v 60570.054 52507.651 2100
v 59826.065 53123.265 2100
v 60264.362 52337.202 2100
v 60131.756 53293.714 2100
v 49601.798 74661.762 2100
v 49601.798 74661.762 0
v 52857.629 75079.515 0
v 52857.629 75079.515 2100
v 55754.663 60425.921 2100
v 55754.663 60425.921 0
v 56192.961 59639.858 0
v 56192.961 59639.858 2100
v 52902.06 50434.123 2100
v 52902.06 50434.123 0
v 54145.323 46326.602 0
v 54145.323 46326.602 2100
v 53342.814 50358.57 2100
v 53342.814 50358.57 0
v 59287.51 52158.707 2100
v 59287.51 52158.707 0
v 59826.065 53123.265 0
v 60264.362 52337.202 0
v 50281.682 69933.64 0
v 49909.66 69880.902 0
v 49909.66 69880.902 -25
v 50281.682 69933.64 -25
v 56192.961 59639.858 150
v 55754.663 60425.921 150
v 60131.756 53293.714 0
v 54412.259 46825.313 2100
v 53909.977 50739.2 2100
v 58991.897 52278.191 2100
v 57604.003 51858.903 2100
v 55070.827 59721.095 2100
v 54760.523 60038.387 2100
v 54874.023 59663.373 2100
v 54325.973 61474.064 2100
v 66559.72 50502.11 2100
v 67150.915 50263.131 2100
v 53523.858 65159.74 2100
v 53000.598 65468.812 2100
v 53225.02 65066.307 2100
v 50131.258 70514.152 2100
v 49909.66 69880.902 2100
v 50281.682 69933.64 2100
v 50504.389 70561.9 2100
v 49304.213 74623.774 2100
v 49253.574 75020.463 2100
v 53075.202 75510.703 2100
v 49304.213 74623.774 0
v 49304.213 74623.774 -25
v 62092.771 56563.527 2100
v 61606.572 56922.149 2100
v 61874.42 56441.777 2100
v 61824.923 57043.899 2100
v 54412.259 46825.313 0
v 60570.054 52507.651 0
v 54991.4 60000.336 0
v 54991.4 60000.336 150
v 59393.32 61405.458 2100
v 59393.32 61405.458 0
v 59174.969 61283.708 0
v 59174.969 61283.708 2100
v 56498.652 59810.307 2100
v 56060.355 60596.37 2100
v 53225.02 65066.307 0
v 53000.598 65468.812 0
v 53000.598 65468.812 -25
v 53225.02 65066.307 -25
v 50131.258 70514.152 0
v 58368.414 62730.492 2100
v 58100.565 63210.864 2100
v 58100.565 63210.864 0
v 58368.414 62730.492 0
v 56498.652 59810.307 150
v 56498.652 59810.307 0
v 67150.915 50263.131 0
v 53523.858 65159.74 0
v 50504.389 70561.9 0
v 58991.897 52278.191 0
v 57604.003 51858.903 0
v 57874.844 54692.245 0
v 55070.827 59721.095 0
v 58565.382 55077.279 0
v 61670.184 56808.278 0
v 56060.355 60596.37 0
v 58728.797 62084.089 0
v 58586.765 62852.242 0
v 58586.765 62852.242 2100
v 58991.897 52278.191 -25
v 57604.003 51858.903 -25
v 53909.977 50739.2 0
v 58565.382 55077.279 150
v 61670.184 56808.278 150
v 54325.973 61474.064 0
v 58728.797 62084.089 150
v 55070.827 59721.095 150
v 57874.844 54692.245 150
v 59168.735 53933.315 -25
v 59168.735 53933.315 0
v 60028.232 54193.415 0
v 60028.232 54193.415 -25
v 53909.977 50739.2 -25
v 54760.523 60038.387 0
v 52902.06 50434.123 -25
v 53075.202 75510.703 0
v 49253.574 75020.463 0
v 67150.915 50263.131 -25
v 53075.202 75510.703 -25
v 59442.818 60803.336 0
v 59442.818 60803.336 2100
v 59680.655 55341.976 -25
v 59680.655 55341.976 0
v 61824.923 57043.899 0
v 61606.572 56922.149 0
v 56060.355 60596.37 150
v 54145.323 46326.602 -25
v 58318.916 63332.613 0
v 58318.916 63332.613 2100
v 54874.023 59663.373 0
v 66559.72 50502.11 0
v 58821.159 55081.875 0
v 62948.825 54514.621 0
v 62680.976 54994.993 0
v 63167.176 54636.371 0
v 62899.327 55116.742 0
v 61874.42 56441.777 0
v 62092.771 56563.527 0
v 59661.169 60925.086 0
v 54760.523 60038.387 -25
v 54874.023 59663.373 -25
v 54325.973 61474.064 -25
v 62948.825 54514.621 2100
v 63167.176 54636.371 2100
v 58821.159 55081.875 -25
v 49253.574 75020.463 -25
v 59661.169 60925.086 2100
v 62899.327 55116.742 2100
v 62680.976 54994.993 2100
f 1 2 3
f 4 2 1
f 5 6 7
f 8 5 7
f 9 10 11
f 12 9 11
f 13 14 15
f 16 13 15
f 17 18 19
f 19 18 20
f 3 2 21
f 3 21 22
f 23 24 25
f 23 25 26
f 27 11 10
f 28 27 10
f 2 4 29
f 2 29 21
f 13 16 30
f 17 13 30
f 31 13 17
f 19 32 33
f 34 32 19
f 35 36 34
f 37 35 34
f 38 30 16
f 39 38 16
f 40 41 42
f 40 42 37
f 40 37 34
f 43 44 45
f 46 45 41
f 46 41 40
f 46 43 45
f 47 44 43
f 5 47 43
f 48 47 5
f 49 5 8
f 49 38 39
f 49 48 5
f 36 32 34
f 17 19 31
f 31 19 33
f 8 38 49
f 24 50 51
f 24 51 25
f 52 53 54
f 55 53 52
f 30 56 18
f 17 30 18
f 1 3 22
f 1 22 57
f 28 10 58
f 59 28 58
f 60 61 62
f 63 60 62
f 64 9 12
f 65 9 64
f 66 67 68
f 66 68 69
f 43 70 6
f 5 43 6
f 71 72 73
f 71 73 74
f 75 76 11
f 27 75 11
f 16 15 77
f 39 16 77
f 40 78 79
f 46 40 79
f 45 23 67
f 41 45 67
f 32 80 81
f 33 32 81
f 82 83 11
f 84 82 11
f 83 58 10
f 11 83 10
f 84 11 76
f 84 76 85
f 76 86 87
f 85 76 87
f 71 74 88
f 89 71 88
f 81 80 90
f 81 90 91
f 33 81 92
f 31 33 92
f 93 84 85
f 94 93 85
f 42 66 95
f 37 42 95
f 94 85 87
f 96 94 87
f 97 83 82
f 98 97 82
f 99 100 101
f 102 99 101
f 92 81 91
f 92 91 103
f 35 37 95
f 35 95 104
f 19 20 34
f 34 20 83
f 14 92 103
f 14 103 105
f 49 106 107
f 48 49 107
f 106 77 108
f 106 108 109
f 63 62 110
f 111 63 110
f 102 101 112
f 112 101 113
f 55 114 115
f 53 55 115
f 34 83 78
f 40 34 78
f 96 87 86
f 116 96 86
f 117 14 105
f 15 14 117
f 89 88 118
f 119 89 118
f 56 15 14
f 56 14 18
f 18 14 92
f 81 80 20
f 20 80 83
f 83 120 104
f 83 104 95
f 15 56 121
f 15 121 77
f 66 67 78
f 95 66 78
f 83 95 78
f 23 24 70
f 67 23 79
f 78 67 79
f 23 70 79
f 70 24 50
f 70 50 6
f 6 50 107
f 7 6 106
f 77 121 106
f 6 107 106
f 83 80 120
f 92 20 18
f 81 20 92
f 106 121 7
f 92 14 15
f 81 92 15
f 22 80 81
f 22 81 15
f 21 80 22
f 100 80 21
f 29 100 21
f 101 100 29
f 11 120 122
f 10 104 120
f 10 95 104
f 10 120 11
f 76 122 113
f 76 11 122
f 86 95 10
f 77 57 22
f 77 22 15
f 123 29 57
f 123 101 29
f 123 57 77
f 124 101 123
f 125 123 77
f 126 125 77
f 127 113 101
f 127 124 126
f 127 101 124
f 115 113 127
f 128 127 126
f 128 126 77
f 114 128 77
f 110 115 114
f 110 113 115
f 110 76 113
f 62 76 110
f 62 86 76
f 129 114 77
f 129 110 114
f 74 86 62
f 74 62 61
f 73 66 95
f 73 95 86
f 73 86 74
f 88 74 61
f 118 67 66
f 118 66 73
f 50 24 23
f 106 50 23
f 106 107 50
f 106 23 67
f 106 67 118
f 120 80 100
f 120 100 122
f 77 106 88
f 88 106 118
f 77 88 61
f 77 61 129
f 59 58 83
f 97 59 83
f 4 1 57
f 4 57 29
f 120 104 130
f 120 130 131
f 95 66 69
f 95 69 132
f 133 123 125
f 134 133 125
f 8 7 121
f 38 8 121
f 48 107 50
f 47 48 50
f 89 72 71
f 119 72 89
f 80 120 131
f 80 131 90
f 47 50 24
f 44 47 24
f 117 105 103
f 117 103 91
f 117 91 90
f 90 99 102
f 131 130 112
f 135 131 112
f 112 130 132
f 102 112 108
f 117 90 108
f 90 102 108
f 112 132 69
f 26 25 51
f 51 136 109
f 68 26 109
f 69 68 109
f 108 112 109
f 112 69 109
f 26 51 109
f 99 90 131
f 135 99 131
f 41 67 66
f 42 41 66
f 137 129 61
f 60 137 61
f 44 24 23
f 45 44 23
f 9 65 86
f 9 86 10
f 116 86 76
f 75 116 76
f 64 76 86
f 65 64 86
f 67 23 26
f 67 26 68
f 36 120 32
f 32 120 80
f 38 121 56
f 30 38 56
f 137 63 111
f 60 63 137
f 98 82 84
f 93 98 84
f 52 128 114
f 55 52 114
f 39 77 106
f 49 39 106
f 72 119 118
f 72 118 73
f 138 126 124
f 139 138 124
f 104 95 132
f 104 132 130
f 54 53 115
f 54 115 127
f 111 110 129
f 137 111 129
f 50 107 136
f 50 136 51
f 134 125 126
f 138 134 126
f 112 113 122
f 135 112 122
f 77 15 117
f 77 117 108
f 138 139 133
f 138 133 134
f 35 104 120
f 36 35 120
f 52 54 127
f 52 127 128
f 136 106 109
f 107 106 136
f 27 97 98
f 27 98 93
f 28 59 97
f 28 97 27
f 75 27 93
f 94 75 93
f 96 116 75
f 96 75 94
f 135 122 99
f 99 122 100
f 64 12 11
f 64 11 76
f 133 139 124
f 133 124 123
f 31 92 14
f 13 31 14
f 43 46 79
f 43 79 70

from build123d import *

# Parameters (mm, degrees)
F3_DEPTH  = 2100
F5_DEPTH  = 25
F7_DEPTH  = 2100
F9_DEPTH  = 150
F11_DEPTH = 25.001


# Not quite as in the source:
# - ends of sketch curves that miss each other by under 0.0002 mm in the source are joined


with BuildPart() as f3:
    # F2 (on Top) → F3 (new body)
    with BuildSketch(Plane.XY):
        Polygon((52902.0595629306, 50434.1230428591), (54145.32292, 46326.602018), (54431.4219269024, 46413.1983883223), (67150.915474, 50263.131268), (53075.201891, 75510.702684), (49253.5741891713, 75020.4629237414), (49304.213105, 74623.774346), (49909.660074, 69880.902321), (50281.682258, 69933.639978), (53000.597675, 65468.812402), (53225.019852, 65066.306629), (54325.972768, 61474.063518), (54760.522861, 60038.387295), (54874.022799, 59663.37285), (58991.897227, 52278.191447), (57604.002801, 51858.903346), (53909.97748, 50739.1999), align=None)
        Polygon((54412.25928, 46825.31334), (53342.81403, 50358.57026), (59287.509616, 52158.706562), (55070.827017, 59721.094989), (53523.858293, 65159.740021), (50504.389213421, 70561.8996273451), (50131.257661, 70514.151722), (49601.798244, 74661.762303), (52857.629236, 75079.514646), (66559.719817, 50502.109853), align=None, mode=Mode.SUBTRACT)
    extrude(amount=F3_DEPTH)


with BuildPart() as f5:
    # F4 (on Top) → F5 (new body)
    with BuildSketch(Plane.XY):
        Polygon((54760.522861, 60038.387295), (54874.022799, 59663.37285), (58991.897227, 52278.191447), (57604.002801, 51858.903346), (53909.97748, 50739.1999), (52902.0595629306, 50434.1230428591), (54145.32292, 46326.602018), (67150.915474, 50263.131268), (53075.201891, 75510.702684), (49253.5741891713, 75020.4629237414), (49304.213105, 74623.774346), (49909.660074, 69880.902321), (50281.682258, 69933.639978), (53000.597675, 65468.812402), (53225.019852, 65066.306629), (54325.972768, 61474.063518), align=None)
    extrude(amount=-F5_DEPTH)

    # F6 (on Top) → F7 (join)
    with BuildSketch(Plane.XY):
        Polygon((63167.175561, 54636.370609), (62899.326908, 55116.742443), (62680.976074, 54994.993056), (62948.824727, 54514.621222), align=None)
        Polygon((61606.57177, 56922.149305), (61874.420423, 56441.777471), (62092.771256, 56563.526859), (61824.922604, 57043.898693), align=None)
        Polygon((60131.75578, 53293.714353), (59826.064613, 53123.26521), (60264.362406, 52337.202212), (60570.053573, 52507.651355), align=None)
        Polygon((56498.652366, 59810.307311), (56060.354571, 60596.370312), (55754.663404, 60425.921169), (56192.961199, 59639.858168), align=None)
        Polygon((59393.320264, 61405.457583), (59174.969431, 61283.708196), (59442.818085, 60803.336359), (59661.168918, 60925.085747), align=None)
        Polygon((58586.764842, 62852.241589), (58318.916189, 63332.613423), (58100.565355, 63210.864035), (58368.414008, 62730.492201), align=None)
    extrude(amount=F7_DEPTH)

    # F10 (on face) → F11 (cut, through all)
    with BuildSketch(Plane.XY):
        Polygon((59168.735458, 53933.31513), (60028.231633, 54193.415485), (59680.654869, 55341.975624), (58821.158694, 55081.875269), align=None)
    extrude(amount=-F11_DEPTH, mode=Mode.SUBTRACT)


with BuildPart() as f9:
    # F8 (on Top) → F9 (new body)
    with BuildSketch(Plane.XY):
        Polygon((58728.797232615, 62084.088870835), (56060.354571, 60596.370312), (56498.652366, 59810.307311), (56192.961199, 59639.858168), (55754.663404, 60425.921169), (54991.3996931603, 60000.3359416475), (55070.827017, 59721.094989), (55102.8168784927, 59663.7229310719), (57874.844064254, 54692.2445670372), (58565.3824039826, 55077.2791403316), (61670.1839855803, 56808.2778988538), align=None)
    extrude(amount=F9_DEPTH)


solid = Compound([f3.part, f5.part, f9.part])
